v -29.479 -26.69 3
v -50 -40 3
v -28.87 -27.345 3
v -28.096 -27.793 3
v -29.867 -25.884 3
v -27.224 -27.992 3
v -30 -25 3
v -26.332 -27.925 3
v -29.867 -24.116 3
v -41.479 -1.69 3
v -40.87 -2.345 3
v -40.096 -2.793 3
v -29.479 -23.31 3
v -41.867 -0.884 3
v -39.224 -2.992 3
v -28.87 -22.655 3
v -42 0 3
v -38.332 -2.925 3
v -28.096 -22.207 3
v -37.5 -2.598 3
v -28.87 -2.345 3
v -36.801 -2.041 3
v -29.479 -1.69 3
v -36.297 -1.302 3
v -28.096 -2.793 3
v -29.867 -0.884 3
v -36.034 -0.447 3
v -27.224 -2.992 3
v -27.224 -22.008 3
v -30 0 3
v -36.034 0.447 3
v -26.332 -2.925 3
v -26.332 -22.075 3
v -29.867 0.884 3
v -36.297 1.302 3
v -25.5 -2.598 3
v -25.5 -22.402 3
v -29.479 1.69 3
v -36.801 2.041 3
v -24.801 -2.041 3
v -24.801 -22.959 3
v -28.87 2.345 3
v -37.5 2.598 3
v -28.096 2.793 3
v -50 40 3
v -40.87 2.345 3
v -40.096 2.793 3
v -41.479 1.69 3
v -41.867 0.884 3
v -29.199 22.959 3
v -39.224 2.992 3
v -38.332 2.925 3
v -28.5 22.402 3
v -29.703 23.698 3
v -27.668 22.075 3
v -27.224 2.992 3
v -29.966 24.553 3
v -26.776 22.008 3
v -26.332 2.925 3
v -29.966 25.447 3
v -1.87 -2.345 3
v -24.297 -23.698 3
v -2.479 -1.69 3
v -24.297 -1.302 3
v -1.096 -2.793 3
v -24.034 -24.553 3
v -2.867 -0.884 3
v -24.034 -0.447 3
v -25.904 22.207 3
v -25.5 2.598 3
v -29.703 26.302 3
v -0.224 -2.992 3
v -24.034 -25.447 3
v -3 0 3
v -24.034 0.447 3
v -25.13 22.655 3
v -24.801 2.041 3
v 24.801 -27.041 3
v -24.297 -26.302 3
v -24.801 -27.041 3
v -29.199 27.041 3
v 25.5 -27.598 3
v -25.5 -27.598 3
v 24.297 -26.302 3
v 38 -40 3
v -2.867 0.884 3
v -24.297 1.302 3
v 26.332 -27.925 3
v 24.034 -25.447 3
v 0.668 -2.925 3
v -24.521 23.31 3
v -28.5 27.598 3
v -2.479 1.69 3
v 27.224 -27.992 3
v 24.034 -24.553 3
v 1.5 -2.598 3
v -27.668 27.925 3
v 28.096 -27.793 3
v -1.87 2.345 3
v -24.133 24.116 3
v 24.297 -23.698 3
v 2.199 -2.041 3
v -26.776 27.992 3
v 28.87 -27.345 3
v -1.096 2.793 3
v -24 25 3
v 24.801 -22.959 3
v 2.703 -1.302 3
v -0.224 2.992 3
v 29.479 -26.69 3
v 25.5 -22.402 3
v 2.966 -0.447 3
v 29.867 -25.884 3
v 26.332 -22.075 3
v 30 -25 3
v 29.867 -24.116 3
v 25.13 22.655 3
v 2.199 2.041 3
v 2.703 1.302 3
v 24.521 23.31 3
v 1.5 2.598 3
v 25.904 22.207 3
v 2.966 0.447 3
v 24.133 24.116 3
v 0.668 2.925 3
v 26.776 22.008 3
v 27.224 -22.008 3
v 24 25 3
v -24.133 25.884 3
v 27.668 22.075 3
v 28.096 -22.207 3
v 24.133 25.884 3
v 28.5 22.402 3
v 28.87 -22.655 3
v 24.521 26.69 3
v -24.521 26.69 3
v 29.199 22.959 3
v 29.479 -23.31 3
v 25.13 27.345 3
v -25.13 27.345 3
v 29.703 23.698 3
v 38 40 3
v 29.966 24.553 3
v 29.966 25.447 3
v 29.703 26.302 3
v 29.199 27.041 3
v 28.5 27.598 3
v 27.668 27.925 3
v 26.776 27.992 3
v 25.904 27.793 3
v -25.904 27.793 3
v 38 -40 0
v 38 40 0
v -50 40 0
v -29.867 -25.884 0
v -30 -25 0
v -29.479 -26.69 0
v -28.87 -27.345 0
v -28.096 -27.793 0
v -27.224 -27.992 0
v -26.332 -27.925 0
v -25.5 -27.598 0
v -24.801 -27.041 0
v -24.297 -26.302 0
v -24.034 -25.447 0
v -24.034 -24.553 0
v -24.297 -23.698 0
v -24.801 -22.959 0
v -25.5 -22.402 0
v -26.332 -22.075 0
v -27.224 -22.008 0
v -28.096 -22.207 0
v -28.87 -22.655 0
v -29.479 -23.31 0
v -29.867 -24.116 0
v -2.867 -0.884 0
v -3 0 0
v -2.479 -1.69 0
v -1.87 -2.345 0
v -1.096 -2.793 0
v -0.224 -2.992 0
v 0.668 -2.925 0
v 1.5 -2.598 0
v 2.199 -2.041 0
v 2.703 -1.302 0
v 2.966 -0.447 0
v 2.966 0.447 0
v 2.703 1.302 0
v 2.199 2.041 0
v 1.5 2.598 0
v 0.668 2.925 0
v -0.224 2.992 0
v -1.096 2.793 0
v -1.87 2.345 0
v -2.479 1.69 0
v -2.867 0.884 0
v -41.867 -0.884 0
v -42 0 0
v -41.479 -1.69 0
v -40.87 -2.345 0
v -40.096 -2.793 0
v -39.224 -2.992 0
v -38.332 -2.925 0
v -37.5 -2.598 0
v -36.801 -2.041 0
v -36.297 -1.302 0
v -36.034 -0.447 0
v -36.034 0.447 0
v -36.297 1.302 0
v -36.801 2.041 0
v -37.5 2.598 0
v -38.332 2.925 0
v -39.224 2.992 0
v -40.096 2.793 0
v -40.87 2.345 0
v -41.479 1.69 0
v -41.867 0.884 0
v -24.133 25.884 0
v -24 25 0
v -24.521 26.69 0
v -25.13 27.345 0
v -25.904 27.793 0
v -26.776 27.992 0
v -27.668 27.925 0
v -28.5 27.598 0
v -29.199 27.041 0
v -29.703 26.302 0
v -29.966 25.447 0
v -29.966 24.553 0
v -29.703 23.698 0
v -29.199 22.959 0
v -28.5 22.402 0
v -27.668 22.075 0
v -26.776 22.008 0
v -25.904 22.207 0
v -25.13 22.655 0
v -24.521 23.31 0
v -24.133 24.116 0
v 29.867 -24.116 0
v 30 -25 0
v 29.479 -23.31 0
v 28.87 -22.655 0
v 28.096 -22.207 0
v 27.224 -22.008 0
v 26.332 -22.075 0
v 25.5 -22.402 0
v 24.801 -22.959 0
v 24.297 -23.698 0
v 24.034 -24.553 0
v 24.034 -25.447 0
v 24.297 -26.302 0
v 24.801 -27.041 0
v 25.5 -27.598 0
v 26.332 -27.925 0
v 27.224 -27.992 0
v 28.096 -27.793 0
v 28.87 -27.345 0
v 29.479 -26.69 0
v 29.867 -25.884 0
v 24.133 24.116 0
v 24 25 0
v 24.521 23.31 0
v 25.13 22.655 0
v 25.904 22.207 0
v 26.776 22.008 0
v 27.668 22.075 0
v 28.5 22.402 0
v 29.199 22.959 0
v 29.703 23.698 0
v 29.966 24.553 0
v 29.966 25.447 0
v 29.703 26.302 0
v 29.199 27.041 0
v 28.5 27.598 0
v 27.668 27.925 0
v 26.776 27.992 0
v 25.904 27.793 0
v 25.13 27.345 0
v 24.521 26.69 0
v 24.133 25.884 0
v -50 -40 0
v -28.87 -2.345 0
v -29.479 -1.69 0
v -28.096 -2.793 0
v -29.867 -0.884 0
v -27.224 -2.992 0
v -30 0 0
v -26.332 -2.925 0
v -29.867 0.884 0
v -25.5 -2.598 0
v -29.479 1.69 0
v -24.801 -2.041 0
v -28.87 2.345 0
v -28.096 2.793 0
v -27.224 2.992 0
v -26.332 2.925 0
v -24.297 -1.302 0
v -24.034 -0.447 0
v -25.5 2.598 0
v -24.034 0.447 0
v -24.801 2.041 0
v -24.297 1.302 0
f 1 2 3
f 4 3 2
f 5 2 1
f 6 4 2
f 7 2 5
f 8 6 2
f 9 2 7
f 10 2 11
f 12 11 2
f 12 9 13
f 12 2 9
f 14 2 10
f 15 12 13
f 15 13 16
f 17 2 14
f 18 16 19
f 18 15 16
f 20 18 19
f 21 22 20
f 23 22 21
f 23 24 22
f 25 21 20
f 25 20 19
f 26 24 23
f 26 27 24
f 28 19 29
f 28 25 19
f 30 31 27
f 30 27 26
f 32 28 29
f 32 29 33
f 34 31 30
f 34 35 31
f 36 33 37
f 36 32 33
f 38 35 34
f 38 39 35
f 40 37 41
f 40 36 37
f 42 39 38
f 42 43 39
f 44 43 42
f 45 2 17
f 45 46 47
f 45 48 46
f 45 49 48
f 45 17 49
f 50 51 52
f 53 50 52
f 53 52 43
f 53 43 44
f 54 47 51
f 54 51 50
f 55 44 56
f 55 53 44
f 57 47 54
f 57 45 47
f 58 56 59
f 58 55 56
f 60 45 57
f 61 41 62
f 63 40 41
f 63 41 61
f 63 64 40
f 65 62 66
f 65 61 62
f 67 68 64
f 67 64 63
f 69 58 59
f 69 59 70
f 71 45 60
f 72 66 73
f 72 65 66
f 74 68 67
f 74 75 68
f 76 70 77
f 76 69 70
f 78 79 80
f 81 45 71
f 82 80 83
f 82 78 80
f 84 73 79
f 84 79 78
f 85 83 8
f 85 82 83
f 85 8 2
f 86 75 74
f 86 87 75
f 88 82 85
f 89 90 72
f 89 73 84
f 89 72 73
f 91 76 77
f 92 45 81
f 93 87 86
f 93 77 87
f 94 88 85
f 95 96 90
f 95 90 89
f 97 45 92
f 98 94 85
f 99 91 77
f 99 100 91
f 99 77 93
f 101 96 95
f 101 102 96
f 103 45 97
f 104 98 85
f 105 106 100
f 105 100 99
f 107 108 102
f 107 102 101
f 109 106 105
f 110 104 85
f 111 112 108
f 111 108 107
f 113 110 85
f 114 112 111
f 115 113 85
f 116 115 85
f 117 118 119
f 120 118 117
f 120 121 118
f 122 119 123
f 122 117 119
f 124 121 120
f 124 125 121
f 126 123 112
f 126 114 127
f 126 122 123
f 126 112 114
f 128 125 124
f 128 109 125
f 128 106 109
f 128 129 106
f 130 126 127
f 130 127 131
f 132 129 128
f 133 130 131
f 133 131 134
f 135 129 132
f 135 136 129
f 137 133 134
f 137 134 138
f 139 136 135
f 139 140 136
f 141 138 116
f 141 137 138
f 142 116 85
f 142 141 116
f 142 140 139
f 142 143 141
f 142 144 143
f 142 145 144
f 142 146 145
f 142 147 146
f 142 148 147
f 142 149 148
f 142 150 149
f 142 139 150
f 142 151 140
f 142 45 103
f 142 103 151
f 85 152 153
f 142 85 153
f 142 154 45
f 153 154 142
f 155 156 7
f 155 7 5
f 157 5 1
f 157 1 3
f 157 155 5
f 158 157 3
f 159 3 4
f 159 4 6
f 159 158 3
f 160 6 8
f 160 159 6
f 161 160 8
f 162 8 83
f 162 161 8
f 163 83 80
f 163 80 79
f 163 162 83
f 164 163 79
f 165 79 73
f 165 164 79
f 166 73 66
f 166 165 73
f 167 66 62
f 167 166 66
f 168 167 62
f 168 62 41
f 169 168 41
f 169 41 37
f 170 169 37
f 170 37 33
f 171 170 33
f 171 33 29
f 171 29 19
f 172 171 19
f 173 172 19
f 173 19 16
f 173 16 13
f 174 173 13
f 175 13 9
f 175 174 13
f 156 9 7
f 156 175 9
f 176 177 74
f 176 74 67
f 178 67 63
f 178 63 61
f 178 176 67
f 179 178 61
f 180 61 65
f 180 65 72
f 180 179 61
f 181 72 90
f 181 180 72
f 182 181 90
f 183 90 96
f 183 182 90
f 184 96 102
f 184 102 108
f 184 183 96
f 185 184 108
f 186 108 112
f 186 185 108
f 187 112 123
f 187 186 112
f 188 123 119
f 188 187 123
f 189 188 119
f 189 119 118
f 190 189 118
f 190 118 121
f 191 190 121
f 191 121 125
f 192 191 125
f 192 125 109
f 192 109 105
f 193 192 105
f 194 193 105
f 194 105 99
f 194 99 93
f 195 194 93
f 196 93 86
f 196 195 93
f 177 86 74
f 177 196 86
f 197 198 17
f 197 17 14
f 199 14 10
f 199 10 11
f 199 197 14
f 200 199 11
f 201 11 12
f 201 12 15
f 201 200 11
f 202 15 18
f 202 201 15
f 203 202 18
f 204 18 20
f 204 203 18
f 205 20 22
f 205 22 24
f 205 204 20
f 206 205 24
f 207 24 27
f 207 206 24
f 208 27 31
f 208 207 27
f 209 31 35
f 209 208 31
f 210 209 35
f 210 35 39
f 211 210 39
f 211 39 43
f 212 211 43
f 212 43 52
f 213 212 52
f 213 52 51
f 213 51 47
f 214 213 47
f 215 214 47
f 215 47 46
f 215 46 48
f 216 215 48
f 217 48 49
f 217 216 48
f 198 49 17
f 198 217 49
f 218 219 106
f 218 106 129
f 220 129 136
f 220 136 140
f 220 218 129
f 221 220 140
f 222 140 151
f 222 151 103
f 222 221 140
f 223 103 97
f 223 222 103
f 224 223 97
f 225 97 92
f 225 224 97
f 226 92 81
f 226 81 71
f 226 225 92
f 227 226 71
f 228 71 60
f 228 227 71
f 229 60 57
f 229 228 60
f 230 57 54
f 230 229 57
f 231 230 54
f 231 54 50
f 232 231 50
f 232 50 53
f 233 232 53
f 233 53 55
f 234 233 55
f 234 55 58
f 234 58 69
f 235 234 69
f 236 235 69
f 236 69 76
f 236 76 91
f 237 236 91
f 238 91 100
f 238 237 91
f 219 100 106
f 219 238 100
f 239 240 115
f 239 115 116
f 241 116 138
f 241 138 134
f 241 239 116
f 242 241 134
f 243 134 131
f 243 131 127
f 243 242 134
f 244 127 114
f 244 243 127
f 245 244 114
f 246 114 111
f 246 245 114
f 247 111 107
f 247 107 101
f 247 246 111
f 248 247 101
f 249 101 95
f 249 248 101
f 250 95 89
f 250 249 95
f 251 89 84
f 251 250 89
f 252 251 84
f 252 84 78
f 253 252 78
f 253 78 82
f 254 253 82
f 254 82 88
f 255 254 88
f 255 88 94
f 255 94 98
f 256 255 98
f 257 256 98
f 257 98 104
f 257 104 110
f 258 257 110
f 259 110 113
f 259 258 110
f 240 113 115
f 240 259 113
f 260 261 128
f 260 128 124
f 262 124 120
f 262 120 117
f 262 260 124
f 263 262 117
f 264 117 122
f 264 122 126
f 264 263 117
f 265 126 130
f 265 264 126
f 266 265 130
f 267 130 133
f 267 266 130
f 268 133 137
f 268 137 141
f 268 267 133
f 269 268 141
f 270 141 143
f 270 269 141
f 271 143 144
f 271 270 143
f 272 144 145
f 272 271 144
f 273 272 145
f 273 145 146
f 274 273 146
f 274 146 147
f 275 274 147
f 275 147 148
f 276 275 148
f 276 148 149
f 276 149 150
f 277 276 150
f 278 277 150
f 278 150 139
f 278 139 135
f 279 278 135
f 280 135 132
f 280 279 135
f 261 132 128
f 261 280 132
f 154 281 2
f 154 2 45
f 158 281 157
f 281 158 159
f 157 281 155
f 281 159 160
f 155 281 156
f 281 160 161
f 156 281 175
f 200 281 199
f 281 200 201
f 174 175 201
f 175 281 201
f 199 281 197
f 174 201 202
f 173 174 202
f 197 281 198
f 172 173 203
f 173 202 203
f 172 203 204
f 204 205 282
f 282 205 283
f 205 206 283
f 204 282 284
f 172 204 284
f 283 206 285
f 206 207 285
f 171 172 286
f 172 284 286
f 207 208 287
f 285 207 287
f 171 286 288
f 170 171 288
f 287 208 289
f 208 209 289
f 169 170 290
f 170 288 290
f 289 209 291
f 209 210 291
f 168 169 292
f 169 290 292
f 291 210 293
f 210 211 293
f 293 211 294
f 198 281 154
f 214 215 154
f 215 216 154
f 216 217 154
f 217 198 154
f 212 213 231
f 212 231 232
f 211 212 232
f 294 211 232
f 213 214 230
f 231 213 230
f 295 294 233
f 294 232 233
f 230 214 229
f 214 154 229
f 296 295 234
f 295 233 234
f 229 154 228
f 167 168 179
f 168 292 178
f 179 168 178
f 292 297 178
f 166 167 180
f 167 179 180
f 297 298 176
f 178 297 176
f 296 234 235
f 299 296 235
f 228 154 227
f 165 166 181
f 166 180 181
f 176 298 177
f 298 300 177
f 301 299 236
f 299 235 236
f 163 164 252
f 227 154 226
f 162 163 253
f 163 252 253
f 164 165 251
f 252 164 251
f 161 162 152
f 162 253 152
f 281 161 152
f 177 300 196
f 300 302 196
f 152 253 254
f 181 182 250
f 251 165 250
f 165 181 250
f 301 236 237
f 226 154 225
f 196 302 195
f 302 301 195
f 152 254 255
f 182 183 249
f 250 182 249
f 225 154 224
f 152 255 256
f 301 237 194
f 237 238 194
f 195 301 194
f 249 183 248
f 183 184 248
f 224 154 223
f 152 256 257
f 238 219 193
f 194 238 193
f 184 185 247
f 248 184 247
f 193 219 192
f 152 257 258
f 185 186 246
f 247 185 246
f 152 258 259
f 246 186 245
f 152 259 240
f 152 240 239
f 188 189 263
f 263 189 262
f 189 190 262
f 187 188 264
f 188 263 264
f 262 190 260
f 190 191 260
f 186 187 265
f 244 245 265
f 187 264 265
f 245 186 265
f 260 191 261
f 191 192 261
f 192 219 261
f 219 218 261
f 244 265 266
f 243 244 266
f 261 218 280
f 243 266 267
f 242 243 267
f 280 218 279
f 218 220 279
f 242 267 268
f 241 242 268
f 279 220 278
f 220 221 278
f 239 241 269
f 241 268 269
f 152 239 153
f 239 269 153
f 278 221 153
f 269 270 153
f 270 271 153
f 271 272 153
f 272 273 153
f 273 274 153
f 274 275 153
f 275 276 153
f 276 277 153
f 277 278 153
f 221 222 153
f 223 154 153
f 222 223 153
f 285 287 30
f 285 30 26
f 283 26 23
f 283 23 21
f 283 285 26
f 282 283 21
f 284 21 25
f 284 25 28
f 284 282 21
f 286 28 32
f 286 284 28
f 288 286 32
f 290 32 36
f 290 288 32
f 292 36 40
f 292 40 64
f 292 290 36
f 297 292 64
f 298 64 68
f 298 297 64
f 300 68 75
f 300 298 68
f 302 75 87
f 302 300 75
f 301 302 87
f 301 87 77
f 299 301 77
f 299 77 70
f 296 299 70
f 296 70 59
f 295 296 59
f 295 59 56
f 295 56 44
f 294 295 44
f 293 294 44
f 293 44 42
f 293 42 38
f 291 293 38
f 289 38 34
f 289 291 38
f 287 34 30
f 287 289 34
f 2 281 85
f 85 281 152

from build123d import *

# Parameters (mm, degrees)
SKETCH_1_W      = 88
SKETCH_1_H      = 80
SKETCH_1_R      = 3
EXTRUDE_1_DEPTH = 3


with BuildPart() as part:
    # 草图1 → 凸台-拉伸1 (new body)
    with BuildSketch(Plane.XY):
        with Locations((-6, 0)):
            Rectangle(SKETCH_1_W, SKETCH_1_H)
        with Locations((-27, 25)):
            Circle(SKETCH_1_R, mode=Mode.SUBTRACT)
        with Locations(Location((27, 25, 0), (0, 0, 180))):
            Circle(SKETCH_1_R, mode=Mode.SUBTRACT)
        with Locations((27, -25)):
            Circle(SKETCH_1_R, mode=Mode.SUBTRACT)
        with Locations(Location((-27, -25, 0), (0, 0, 180))):
            Circle(SKETCH_1_R, mode=Mode.SUBTRACT)
        with Locations(Location((0, 0, 0), (0, 0, 180))):
            Circle(SKETCH_1_R, mode=Mode.SUBTRACT)
        with Locations(Location((-39, 0, 0), (0, 0, 180))):
            Circle(SKETCH_1_R, mode=Mode.SUBTRACT)
        with Locations(Location((-27, 0, 0), (0, 0, 180))):
            Circle(SKETCH_1_R, mode=Mode.SUBTRACT)
    extrude(amount=EXTRUDE_1_DEPTH)


solid = part.part
